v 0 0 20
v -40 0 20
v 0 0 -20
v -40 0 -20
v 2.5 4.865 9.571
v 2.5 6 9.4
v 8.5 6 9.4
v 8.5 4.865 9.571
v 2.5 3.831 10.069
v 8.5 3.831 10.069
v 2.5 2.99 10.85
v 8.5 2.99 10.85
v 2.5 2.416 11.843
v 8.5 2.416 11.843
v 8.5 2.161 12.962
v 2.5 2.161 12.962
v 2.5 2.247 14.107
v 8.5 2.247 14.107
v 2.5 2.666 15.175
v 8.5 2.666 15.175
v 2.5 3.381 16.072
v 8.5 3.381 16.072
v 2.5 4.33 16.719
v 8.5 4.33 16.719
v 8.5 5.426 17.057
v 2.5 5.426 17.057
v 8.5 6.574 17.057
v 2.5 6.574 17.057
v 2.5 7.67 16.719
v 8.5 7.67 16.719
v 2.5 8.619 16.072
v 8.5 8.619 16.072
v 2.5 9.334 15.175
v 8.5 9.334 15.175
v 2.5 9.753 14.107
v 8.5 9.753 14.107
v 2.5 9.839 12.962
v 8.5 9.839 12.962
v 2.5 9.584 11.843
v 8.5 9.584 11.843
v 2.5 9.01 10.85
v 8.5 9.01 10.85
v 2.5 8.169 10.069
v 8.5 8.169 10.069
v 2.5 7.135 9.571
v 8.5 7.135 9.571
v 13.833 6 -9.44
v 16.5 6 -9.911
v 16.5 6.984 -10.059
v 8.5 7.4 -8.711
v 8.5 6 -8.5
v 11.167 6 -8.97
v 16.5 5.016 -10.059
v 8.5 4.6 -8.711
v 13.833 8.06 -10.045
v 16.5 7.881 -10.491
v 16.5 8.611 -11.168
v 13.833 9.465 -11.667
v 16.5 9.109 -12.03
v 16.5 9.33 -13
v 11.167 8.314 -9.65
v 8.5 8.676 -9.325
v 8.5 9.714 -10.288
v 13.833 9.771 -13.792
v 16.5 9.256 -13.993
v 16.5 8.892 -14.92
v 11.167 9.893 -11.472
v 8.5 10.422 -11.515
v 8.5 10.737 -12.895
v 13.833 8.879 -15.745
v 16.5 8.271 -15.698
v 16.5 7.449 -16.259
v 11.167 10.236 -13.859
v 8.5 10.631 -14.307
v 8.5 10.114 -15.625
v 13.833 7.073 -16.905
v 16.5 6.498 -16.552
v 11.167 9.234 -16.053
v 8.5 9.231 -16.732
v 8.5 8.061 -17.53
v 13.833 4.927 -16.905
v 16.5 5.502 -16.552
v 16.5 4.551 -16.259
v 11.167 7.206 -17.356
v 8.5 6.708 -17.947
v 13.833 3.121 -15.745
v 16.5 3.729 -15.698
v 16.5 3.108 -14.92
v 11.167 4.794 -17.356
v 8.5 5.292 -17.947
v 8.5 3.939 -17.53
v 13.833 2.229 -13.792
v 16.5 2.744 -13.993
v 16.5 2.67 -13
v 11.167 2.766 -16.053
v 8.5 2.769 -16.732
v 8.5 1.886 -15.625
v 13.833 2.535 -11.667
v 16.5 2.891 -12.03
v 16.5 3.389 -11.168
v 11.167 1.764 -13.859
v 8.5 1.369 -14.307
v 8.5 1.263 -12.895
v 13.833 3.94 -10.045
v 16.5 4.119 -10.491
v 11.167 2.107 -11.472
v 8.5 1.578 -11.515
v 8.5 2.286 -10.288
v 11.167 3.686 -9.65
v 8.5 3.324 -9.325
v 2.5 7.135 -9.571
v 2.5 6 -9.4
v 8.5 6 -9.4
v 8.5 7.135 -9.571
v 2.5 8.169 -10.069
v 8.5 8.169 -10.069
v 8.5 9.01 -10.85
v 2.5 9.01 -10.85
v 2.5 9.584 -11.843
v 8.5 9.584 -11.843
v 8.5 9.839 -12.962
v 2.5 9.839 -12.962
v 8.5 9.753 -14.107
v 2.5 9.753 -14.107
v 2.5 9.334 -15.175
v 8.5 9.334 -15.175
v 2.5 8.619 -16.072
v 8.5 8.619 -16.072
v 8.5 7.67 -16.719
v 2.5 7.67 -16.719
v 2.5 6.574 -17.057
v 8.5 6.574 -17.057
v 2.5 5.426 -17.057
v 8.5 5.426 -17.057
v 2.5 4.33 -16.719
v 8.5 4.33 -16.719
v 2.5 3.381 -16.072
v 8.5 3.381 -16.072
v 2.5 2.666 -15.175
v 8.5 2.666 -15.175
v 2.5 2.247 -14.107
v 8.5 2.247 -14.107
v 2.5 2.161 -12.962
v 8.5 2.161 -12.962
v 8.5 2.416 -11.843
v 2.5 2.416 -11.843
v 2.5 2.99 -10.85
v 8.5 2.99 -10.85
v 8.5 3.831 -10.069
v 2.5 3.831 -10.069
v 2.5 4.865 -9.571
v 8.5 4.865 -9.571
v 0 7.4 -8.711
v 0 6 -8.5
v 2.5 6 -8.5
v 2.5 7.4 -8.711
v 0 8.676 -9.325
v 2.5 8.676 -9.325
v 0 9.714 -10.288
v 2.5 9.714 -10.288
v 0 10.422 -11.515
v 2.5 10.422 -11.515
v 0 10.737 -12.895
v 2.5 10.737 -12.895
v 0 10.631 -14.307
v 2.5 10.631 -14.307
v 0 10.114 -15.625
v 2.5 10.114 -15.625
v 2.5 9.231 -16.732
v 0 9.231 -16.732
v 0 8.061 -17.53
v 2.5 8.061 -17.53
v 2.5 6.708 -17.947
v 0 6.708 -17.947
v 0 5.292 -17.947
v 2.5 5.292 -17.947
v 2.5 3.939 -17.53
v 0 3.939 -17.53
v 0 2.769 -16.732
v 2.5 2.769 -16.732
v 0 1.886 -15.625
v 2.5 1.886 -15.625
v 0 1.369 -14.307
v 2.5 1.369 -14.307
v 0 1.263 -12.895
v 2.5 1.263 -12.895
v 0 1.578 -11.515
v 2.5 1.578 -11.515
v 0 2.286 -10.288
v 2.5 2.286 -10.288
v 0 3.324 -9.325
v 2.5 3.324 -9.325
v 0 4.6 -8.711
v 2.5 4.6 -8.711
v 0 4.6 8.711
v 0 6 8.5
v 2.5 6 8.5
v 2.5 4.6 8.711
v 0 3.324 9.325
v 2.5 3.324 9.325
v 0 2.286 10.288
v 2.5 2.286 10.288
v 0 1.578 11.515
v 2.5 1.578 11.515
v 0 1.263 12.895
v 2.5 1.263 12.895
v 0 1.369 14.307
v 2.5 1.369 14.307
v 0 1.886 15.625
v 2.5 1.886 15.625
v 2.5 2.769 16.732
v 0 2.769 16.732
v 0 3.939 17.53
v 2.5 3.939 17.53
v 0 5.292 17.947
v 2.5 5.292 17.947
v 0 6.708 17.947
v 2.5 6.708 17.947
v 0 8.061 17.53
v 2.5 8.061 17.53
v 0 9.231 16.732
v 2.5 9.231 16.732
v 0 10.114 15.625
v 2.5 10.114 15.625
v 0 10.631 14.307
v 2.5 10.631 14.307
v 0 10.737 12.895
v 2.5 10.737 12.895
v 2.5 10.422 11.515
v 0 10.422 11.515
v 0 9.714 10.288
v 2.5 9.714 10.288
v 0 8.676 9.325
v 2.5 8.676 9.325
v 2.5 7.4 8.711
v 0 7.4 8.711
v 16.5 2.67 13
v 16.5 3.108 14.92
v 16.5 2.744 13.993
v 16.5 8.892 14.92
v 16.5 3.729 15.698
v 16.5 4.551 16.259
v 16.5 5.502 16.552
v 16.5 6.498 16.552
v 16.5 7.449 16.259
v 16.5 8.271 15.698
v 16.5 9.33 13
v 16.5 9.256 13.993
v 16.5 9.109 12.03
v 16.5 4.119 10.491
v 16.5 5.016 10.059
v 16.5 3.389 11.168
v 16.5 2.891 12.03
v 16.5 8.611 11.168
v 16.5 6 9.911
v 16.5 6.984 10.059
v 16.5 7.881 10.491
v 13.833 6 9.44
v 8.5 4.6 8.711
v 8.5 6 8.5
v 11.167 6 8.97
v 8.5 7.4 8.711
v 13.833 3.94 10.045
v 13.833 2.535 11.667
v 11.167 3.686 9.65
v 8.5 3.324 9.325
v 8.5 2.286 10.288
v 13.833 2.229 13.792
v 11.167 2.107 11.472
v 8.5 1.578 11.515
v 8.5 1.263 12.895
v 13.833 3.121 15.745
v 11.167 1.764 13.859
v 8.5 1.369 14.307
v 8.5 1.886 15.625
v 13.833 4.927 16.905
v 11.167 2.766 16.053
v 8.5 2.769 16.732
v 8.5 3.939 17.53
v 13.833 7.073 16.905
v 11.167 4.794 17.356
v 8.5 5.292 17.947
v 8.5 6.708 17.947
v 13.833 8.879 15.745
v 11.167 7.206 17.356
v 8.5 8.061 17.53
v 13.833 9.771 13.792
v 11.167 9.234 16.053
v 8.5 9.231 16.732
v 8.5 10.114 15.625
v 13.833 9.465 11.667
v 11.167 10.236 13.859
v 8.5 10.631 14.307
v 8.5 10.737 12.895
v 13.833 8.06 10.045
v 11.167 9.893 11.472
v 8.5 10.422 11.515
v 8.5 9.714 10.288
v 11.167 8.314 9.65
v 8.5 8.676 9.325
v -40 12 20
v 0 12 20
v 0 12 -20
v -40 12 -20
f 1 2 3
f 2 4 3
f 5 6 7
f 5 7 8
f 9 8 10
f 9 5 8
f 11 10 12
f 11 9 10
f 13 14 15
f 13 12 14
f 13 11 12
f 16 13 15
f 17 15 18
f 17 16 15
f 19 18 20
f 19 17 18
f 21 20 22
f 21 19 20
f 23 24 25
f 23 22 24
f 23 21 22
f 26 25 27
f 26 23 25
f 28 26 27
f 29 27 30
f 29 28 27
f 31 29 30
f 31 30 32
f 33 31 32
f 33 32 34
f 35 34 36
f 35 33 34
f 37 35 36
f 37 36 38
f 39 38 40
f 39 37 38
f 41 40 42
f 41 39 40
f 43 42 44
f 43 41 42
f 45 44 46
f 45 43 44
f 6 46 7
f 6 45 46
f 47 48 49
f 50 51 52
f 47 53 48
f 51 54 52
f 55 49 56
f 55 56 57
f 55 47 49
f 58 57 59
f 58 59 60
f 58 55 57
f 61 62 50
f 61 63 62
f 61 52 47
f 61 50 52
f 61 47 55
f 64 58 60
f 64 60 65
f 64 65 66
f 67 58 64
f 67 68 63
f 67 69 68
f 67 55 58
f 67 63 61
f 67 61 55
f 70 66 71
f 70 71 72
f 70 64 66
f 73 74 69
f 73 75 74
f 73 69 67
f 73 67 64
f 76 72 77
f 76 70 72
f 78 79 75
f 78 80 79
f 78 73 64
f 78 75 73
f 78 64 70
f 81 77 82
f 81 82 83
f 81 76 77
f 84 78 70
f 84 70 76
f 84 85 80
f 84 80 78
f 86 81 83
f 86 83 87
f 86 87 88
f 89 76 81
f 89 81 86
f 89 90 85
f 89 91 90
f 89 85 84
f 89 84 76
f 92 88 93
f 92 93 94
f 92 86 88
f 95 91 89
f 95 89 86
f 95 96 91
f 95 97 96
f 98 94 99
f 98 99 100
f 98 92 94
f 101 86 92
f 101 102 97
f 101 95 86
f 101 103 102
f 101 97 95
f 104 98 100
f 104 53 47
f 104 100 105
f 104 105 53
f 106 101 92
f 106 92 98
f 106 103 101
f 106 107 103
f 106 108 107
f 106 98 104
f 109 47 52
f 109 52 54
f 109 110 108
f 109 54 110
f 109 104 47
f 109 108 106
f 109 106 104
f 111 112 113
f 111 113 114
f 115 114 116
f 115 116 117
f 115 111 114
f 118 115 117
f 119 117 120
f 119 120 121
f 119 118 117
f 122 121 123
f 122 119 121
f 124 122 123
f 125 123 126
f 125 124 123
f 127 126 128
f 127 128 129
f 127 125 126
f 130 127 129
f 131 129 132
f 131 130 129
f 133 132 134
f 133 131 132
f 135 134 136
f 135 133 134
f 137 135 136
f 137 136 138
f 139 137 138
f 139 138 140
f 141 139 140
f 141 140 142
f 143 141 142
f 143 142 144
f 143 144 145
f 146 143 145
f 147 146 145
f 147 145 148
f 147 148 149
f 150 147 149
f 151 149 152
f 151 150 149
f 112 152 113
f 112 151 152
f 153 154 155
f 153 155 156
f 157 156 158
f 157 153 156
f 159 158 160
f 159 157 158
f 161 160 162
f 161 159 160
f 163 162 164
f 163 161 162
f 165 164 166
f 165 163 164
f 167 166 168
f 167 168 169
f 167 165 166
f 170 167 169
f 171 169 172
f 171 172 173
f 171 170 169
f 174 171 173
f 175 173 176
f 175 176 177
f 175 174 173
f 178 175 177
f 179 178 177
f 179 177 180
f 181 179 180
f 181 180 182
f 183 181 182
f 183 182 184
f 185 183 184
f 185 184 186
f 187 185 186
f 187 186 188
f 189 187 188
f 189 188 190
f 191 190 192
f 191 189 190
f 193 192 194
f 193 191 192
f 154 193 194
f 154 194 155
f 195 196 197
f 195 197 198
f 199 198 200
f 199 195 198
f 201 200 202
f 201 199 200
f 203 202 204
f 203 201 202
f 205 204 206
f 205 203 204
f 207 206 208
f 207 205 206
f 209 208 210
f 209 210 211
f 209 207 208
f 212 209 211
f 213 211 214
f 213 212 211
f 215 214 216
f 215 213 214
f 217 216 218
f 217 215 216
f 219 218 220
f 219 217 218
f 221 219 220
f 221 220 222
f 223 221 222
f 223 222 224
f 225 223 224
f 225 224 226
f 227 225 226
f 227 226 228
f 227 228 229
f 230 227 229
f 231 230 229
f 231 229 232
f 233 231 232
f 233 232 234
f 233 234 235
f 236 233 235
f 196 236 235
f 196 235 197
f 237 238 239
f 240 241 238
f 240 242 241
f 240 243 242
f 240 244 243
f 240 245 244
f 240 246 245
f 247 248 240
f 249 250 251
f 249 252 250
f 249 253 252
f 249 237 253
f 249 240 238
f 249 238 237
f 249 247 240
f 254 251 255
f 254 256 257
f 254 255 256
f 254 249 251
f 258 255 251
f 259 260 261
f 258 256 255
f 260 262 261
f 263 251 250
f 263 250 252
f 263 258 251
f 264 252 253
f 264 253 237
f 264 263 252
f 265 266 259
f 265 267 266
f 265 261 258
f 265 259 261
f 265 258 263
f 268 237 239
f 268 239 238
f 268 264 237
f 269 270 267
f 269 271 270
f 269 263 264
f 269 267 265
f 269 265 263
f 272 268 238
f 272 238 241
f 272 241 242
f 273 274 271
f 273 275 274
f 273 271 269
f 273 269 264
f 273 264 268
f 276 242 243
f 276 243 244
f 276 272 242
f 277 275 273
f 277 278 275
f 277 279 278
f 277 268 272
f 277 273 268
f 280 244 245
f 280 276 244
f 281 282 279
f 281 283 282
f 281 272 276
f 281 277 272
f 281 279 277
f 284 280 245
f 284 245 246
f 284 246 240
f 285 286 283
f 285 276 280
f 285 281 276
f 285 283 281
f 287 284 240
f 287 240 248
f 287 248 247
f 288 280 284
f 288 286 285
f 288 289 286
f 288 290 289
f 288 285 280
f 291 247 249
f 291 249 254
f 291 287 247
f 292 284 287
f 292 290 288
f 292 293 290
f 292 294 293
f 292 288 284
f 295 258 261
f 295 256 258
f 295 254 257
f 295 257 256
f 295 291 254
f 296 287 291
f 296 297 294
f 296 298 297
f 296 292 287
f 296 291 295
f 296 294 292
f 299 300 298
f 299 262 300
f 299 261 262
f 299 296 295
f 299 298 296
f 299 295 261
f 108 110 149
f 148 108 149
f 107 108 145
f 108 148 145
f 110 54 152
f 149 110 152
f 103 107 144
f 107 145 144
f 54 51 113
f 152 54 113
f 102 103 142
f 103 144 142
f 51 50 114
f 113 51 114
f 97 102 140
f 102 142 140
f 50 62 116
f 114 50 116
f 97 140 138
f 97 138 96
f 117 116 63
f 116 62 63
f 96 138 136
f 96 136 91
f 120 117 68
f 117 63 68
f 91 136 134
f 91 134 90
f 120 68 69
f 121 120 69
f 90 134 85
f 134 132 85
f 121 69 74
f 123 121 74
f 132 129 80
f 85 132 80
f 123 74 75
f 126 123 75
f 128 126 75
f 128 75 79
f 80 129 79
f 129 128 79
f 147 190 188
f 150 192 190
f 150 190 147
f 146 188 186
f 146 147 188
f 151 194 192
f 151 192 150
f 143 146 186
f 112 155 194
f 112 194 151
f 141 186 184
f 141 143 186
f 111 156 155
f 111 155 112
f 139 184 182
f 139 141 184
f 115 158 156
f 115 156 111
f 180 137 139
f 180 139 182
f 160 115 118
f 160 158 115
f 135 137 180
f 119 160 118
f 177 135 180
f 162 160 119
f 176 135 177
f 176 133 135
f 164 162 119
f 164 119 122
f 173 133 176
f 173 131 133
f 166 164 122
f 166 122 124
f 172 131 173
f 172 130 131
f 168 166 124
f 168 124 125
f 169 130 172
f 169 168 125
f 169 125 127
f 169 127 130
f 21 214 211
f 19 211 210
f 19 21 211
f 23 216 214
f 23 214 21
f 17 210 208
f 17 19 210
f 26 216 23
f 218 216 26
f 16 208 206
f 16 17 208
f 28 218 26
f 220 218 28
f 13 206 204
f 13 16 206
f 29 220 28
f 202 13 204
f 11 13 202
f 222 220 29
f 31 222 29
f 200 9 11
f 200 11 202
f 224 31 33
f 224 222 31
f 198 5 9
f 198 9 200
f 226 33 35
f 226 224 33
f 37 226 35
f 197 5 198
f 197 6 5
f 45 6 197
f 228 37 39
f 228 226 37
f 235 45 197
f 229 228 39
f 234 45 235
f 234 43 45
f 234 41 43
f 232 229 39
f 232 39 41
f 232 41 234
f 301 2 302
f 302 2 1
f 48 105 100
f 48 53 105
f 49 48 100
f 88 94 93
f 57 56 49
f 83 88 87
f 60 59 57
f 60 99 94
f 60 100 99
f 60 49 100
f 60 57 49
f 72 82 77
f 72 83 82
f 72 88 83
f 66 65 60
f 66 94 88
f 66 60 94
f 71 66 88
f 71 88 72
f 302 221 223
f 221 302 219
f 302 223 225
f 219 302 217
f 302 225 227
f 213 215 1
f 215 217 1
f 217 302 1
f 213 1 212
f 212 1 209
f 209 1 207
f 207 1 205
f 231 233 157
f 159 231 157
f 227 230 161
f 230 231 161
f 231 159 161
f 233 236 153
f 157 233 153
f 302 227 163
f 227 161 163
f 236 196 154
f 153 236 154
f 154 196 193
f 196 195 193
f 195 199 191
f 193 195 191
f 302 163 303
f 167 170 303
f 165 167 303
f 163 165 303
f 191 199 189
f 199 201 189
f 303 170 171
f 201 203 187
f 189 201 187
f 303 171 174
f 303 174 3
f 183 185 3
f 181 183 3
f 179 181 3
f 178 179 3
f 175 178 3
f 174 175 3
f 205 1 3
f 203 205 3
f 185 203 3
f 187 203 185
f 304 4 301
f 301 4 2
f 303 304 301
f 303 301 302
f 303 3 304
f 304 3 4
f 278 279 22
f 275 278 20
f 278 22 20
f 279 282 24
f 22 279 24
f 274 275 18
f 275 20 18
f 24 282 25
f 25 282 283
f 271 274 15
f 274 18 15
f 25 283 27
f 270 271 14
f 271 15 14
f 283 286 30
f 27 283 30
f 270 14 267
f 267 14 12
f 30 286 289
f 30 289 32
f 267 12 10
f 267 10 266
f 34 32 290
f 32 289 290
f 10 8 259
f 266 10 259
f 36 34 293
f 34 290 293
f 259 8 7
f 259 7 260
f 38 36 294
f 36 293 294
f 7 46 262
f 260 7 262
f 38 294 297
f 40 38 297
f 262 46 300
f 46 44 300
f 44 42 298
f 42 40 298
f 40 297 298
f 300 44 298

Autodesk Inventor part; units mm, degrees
ref_plane "YZ Plane" through (0, 0, 0) normal (1, 0, 0) x (0, 1, 0)
ref_plane "XZ Plane" through (0, 0, 0) normal (0, 1, 0) x (-1, 0, 0)
ref_plane "XY Plane" through (0, 0, 0) normal (0, 0, 1) x (1, 0, 0)
sketch "Szkic1" plane through (0, 0, 0) normal (0, 1, 0) x (-1, 0, 0)
  line L0 (0, 0) -> (40, 0)
  line L1 (40, 0) -> (40, 20)
  line L2 (40, 20) -> (0, 20)
  line L3 (0, 20) -> (0, 0)
  dimension "d0" = 40
  dimension "d1" = 20
extrude "Wyciągnięcie proste1" add sketch "Szkic1" along normal blind 12
sketch "Szkic2" plane through (0, 12, 0) normal (0, 1, 0) x (1, 0, 0)
  point P0 (0, 0)
sketch "Szkic3" plane through (0, 0, 20) normal (1, 0, 0) x (0, 0, -1)
  line L0 (0, 0) -> (0, 12) projected
  line L1 (0, 6) -> (6.75, 6)
  circle A0 centre (6.75, 6) radius 4.75
  point P0 (20, 0)
  dimension "d4" = 6.75
  dimension "d5" = 9.5
extrude "Wyciągnięcie proste2" add sketch "Szkic3" along normal blind 2.5
sketch "Szkic4" plane through (2.5, 6, 13.25) normal (1, 0, 0) x (0, 0, -1)
  circle A0 centre (0, 0) radius 3.85
  point P0 (13.25, -6)
  dimension "d8" = 7.7
extrude "Wyciągnięcie proste3" add sketch "Szkic4" along normal blind 6
sketch "Szkic5" plane through (8.5, 6, 13.25) normal (1, 0, 0) x (0, 0, -1)
  circle A0 centre (0, 0) radius 4.75
  point P0 (13.25, -6)
extrude "Wyciągnięcie proste4" add sketch "Szkic5" along normal blind 8 draft -10
mirror "Odbij1" about plane through (0, 0, 0) normal (0, 0, 1) of "Wyciągnięcie proste4", "Wyciągnięcie proste3", "Wyciągnięcie proste2", "Wyciągnięcie proste1"
properties part number "blokwodny" material "Żywica fenolowa"
